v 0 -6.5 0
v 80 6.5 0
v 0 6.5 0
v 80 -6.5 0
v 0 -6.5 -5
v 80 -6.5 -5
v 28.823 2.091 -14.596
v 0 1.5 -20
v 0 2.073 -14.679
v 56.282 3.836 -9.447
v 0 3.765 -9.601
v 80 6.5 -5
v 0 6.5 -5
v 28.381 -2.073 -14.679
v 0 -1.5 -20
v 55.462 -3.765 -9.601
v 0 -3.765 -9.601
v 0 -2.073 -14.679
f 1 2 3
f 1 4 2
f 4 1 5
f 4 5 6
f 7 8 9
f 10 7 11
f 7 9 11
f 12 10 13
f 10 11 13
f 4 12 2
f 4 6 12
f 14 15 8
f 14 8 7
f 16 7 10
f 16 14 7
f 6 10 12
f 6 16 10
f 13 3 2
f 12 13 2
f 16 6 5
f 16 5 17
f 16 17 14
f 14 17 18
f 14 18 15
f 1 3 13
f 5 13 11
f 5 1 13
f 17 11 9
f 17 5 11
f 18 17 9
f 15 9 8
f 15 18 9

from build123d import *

# Parameters (mm, degrees)
F1_DEPTH = 6.5
F3_DEPTH = 80


with BuildPart() as f1:
    # F0 (on Front) → F1 (new body, symmetric)
    with BuildSketch(Plane.XZ):
        Polygon((80, 0), (0, 0), (0, -20), (80, -5), align=None)
    extrude(amount=F1_DEPTH, both=True)

    # F2 (on Right) → F3 (intersect)
    with BuildSketch(Plane.YZ):
        with BuildLine():
            Line((6.5, 0), (-6.5, 0))
            Line((-6.5, 0), (-6.5, -5))
            ThreePointArc((-6.5, -5), (-2.782918, -12.094306), (-1.5, -20))
            Line((-1.5, -20), (1.5, -20))
            ThreePointArc((1.5, -20), (2.782918, -12.094306), (6.5, -5))
            Line((6.5, -5), (6.5, 0))
        make_face()
    extrude(amount=F3_DEPTH, mode=Mode.INTERSECT)


solid = f1.part
